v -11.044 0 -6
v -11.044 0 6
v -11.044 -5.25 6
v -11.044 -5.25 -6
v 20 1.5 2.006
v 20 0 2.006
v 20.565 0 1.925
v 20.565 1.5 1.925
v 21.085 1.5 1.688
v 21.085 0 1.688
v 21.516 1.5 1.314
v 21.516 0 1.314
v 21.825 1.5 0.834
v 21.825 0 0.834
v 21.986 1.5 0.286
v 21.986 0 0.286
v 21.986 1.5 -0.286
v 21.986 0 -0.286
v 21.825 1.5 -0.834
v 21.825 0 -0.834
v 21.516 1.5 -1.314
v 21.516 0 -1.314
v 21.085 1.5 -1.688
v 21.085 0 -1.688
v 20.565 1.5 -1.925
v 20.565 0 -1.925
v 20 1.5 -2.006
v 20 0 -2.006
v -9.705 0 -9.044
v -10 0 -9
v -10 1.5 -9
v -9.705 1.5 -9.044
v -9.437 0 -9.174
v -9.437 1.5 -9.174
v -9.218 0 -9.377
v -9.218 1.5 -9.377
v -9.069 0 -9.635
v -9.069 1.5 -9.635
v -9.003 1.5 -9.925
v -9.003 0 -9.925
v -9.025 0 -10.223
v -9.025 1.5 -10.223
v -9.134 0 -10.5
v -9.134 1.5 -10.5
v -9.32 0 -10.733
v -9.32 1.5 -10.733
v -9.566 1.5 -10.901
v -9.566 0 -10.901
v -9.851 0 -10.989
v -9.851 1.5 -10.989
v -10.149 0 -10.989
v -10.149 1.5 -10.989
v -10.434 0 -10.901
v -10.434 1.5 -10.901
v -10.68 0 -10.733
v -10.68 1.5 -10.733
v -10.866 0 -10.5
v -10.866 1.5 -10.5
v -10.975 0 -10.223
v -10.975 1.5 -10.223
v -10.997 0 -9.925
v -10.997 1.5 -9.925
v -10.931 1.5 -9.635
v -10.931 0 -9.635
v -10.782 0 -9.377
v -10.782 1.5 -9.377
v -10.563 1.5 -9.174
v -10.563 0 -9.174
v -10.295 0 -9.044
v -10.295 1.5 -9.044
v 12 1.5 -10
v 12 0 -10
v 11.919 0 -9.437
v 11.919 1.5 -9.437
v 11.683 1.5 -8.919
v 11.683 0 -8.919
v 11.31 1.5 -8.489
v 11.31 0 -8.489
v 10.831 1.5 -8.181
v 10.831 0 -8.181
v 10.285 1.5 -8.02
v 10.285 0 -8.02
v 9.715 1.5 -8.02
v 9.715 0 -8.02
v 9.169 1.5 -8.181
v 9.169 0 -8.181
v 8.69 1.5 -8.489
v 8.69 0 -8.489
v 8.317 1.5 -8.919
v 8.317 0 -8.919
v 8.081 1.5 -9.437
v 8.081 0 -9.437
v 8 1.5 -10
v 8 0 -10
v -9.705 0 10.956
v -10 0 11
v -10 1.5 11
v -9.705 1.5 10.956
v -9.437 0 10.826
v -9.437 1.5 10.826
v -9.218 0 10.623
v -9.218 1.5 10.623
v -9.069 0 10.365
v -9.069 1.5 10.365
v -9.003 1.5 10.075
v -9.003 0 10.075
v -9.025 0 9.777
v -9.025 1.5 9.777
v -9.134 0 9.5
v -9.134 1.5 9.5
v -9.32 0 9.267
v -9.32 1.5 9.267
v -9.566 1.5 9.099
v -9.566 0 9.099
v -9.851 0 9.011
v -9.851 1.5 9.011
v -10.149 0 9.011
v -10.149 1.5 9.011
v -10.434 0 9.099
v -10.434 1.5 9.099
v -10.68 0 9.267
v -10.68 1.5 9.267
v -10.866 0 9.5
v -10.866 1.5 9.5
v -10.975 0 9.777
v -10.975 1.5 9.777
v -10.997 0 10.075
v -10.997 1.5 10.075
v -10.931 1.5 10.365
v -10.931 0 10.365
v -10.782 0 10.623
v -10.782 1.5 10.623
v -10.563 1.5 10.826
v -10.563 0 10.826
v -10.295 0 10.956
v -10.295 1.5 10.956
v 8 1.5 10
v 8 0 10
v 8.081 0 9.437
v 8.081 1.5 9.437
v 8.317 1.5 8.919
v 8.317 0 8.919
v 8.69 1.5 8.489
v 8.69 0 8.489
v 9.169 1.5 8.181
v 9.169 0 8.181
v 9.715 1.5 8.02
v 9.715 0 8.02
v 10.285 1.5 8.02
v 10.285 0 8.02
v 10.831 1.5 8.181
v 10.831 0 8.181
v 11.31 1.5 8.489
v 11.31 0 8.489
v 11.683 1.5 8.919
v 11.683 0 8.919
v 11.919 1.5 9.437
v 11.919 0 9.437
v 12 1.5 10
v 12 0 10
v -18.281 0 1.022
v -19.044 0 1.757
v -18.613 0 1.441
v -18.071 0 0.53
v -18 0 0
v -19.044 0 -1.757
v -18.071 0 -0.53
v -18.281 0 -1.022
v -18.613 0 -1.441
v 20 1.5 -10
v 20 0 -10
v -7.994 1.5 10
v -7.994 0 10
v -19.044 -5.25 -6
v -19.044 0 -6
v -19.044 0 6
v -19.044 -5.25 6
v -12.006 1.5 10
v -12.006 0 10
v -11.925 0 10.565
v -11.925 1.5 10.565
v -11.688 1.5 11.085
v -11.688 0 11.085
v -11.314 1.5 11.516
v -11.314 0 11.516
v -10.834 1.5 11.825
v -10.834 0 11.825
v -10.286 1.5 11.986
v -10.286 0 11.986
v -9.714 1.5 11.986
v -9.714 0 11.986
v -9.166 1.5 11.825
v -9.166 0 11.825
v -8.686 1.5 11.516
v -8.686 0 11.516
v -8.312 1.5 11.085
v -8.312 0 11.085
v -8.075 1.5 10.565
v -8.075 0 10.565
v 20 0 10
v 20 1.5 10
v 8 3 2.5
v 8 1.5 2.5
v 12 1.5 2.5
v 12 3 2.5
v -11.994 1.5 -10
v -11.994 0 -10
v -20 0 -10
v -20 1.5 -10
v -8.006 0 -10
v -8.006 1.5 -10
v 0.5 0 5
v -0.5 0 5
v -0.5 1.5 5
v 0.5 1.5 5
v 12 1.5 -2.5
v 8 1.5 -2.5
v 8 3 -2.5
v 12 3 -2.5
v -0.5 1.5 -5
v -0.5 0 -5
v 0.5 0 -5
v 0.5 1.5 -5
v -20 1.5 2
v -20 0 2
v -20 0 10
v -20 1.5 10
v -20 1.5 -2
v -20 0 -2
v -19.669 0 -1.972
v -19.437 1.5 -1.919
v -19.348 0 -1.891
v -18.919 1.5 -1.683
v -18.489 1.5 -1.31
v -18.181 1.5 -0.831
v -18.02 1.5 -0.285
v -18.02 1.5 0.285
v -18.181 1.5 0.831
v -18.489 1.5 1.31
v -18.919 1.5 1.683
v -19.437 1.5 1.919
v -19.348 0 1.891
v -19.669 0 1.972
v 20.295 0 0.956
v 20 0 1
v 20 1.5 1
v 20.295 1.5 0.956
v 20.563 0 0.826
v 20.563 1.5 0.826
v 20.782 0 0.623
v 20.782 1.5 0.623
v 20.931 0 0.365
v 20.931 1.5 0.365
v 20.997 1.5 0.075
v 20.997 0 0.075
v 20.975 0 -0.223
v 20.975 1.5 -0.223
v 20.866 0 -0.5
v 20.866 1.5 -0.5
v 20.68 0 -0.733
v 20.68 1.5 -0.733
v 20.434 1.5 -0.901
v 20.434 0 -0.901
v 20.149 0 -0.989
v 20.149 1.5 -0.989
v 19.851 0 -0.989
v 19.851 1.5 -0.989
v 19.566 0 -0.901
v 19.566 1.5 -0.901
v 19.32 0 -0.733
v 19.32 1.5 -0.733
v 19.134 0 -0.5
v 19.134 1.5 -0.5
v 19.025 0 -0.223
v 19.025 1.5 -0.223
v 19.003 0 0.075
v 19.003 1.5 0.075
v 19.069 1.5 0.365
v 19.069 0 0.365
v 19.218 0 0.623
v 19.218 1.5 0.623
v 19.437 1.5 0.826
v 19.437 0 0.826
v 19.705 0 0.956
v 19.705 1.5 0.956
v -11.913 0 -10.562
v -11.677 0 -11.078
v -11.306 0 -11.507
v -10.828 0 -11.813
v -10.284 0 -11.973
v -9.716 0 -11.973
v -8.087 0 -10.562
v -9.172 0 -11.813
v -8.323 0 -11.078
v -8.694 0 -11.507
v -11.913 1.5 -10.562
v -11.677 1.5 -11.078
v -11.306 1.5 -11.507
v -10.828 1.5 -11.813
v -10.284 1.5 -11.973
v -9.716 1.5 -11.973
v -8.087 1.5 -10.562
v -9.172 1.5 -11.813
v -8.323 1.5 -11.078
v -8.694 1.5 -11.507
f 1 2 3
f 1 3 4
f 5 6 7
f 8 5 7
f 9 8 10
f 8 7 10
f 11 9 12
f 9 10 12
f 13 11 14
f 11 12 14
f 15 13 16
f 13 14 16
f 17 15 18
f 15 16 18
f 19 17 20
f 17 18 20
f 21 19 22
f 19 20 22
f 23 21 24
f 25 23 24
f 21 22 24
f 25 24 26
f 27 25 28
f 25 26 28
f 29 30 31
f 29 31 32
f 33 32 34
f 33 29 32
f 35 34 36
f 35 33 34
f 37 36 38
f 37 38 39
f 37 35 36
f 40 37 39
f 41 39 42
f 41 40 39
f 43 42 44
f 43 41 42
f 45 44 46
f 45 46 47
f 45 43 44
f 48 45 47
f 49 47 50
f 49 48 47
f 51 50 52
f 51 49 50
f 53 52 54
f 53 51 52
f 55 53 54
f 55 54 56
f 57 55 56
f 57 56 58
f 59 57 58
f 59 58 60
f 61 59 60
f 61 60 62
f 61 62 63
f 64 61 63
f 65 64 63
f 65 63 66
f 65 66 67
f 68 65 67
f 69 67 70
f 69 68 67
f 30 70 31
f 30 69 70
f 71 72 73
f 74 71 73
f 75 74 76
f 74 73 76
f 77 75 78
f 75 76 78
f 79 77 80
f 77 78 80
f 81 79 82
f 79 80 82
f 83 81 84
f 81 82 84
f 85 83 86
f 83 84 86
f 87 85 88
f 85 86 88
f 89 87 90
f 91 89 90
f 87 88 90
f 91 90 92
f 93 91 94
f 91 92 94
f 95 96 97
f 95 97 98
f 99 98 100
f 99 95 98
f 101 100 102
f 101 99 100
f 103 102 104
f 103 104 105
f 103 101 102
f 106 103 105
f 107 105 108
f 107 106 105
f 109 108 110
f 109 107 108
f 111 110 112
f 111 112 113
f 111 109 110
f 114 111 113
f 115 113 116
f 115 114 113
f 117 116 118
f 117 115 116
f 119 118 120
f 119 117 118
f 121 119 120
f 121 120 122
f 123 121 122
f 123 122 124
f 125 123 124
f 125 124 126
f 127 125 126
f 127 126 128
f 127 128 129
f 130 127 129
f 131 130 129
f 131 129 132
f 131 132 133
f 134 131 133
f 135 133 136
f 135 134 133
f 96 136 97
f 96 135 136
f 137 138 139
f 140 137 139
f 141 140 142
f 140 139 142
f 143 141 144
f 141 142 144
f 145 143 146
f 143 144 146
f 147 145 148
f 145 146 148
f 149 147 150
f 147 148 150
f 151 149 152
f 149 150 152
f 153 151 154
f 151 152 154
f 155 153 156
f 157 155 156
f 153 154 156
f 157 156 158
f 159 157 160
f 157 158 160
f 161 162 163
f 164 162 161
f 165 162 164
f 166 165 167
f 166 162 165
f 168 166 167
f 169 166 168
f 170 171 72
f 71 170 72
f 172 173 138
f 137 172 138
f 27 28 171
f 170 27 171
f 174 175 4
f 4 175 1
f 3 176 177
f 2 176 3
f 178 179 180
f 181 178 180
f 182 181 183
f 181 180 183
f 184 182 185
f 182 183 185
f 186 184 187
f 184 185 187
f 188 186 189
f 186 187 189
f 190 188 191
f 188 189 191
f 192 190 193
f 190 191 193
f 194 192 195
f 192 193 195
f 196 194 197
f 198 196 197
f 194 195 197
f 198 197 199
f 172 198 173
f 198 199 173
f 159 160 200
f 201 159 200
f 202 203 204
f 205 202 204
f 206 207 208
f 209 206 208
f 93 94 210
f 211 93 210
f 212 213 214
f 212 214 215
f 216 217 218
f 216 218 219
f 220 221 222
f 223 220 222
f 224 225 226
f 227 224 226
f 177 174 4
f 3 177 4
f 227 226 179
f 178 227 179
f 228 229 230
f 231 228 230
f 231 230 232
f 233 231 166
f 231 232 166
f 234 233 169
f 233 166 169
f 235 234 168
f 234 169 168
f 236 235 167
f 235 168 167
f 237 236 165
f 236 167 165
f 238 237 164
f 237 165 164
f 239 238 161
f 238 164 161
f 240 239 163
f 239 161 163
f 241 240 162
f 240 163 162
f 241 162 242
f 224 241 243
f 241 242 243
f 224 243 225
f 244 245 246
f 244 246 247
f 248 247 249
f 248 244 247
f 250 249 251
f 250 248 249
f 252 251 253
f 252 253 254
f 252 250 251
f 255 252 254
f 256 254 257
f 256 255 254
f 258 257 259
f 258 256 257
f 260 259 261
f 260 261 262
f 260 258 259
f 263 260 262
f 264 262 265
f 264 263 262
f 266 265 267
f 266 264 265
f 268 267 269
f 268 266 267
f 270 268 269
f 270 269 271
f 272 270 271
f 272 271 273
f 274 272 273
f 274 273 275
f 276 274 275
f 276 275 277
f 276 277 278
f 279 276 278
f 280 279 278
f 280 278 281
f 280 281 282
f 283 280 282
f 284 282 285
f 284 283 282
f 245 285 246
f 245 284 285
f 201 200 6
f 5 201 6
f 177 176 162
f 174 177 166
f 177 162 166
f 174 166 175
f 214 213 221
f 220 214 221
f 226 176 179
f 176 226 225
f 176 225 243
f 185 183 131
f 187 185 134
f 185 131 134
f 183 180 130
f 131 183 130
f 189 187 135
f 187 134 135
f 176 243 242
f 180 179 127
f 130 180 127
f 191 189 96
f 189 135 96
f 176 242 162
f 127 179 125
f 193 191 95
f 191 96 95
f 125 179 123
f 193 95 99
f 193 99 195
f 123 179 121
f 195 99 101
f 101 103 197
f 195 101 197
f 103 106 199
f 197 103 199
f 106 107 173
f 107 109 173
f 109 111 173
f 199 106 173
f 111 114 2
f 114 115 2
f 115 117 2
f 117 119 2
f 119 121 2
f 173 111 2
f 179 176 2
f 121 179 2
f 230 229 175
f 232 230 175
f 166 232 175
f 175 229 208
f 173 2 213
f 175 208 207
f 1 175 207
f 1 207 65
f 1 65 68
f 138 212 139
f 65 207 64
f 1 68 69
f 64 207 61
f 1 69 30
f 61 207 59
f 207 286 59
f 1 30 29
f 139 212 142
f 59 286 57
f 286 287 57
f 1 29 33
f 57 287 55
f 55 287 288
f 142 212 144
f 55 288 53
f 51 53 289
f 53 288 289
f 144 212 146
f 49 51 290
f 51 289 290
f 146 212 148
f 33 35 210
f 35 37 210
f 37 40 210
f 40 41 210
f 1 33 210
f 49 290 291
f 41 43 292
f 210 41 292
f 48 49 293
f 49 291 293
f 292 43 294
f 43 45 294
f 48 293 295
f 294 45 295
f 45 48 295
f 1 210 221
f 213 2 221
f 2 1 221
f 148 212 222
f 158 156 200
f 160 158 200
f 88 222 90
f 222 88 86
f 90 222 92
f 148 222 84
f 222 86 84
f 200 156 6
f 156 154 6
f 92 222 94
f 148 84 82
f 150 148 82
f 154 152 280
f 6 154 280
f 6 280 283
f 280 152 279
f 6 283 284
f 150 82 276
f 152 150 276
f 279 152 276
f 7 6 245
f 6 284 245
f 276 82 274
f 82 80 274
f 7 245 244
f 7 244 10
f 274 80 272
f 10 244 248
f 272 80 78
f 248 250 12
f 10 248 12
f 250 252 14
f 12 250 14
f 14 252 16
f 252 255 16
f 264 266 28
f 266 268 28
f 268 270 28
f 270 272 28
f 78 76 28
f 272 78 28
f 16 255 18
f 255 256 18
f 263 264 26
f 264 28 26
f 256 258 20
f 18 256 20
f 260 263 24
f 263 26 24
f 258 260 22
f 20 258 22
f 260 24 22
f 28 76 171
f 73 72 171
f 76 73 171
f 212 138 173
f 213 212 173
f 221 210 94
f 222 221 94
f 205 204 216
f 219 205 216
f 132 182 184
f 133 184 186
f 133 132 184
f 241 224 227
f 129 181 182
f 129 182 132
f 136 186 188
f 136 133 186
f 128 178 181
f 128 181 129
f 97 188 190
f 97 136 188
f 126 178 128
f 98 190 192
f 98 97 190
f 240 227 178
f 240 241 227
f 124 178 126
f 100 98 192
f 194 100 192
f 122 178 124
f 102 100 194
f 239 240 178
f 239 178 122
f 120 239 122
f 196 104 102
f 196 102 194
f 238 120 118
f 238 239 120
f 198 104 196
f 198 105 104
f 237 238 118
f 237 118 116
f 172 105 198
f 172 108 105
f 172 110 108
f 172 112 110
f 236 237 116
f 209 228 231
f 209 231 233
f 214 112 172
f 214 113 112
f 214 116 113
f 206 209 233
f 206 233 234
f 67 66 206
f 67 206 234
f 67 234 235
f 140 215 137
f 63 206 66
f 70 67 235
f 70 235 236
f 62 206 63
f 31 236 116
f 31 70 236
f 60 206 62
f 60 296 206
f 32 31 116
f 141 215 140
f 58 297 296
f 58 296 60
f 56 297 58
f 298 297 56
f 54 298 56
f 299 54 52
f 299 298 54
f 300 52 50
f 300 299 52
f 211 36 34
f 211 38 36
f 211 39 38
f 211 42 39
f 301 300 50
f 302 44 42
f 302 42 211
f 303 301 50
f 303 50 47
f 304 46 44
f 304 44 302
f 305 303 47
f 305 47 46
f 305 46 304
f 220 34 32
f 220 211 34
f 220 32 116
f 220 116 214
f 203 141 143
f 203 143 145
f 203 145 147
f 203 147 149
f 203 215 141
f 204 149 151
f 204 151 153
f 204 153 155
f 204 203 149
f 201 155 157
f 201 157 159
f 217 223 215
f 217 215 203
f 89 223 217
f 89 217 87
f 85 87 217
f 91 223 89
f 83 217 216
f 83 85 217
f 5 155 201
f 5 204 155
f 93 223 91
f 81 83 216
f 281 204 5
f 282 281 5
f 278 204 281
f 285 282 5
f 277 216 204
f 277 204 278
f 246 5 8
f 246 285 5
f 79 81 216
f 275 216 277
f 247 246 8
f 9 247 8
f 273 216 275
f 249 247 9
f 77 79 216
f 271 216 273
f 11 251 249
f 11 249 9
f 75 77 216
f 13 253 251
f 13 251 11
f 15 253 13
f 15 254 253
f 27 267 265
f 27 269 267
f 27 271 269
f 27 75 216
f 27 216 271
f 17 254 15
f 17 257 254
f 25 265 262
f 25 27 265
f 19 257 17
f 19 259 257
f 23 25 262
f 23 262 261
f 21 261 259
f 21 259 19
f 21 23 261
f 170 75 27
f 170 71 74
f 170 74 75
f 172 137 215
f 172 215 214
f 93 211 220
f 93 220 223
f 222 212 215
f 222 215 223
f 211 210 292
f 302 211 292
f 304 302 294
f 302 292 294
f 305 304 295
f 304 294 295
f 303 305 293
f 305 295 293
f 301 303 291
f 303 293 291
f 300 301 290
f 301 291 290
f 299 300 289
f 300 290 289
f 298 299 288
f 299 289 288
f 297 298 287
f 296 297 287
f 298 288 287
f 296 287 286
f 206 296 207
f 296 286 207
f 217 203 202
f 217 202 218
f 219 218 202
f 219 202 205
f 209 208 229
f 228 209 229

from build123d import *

# Parameters (mm, degrees)
ESQUISSE1_R           = 1
ESQUISSE1_W           = 1
ESQUISSE1_H           = 10
BASE_DEPTH            = 1.5
ESQUISSE2_W           = 4
ESQUISSE2_H           = 5
SOIC_8_DEPTH          = 1.5
ESQUISSE3_W           = 8
ESQUISSE3_H           = 12
GROVE_CONNECTOR_DEPTH = 5.25


with BuildPart() as part:
    # Esquisse1 → Base (new body)
    with BuildSketch(Plane(origin=(0, 0, 0), x_dir=(1, 0, 0), z_dir=(0, 1, 0))):
        with BuildLine():
            Line((-20, -2), (-20, -10))
            Line((-20, -10), (-12.006445979, -10))
            ThreePointArc((-12.006445979, -10), (-10, -12.006445979), (-7.993554021, -10))
            Line((-7.993554021, -10), (8, -10))
            ThreePointArc((8, -10), (10, -8), (12, -10))
            Line((12, -10), (20, -10))
            Line((20, -10), (20, -2.006445979))
            ThreePointArc((20, -2.006445979), (22.006445979, 0), (20, 2.006445979))
            Line((20, 2.006445979), (20, 10))
            Line((20, 10), (12, 10))
            ThreePointArc((12, 10), (10, 8), (8, 10))
            Line((8, 10), (-8.006445979, 10))
            ThreePointArc((-8.006445979, 10), (-10, 11.993554021), (-11.993554021, 10))
            Line((-11.993554021, 10), (-20, 10))
            Line((-20, 10), (-20, 2))
            ThreePointArc((-20, 2), (-18, 0), (-20, -2))
        make_face()
        with Locations(Location((20, 0, 0), (0, 0, 270))):
            Circle(ESQUISSE1_R, mode=Mode.SUBTRACT)
        with Locations(Location((-10, 10, 0), (0, 0, 270))):
            Circle(ESQUISSE1_R, mode=Mode.SUBTRACT)
        with Locations(Location((-10, -10, 0), (0, 0, 270))):
            Circle(ESQUISSE1_R, mode=Mode.SUBTRACT)
        Rectangle(ESQUISSE1_W, ESQUISSE1_H, mode=Mode.SUBTRACT)
    extrude(amount=BASE_DEPTH)

    # Esquisse2 → SOIC-8 (add)
    with BuildSketch(Plane(origin=(0, 1.5, 0), x_dir=(1, 0, 0), z_dir=(0, 1, 0))):
        with Locations((10, 0)):
            Rectangle(ESQUISSE2_W, ESQUISSE2_H)
    extrude(amount=SOIC_8_DEPTH)

    # Esquisse3 → Grove connector (add)
    with BuildSketch(Plane(origin=(0, 0, 0), x_dir=(1, 0, 0), z_dir=(0, 1, 0))):
        with Locations((-15.044217332, 0)):
            Rectangle(ESQUISSE3_W, ESQUISSE3_H)
    extrude(amount=-GROVE_CONNECTOR_DEPTH)


solid = part.part
